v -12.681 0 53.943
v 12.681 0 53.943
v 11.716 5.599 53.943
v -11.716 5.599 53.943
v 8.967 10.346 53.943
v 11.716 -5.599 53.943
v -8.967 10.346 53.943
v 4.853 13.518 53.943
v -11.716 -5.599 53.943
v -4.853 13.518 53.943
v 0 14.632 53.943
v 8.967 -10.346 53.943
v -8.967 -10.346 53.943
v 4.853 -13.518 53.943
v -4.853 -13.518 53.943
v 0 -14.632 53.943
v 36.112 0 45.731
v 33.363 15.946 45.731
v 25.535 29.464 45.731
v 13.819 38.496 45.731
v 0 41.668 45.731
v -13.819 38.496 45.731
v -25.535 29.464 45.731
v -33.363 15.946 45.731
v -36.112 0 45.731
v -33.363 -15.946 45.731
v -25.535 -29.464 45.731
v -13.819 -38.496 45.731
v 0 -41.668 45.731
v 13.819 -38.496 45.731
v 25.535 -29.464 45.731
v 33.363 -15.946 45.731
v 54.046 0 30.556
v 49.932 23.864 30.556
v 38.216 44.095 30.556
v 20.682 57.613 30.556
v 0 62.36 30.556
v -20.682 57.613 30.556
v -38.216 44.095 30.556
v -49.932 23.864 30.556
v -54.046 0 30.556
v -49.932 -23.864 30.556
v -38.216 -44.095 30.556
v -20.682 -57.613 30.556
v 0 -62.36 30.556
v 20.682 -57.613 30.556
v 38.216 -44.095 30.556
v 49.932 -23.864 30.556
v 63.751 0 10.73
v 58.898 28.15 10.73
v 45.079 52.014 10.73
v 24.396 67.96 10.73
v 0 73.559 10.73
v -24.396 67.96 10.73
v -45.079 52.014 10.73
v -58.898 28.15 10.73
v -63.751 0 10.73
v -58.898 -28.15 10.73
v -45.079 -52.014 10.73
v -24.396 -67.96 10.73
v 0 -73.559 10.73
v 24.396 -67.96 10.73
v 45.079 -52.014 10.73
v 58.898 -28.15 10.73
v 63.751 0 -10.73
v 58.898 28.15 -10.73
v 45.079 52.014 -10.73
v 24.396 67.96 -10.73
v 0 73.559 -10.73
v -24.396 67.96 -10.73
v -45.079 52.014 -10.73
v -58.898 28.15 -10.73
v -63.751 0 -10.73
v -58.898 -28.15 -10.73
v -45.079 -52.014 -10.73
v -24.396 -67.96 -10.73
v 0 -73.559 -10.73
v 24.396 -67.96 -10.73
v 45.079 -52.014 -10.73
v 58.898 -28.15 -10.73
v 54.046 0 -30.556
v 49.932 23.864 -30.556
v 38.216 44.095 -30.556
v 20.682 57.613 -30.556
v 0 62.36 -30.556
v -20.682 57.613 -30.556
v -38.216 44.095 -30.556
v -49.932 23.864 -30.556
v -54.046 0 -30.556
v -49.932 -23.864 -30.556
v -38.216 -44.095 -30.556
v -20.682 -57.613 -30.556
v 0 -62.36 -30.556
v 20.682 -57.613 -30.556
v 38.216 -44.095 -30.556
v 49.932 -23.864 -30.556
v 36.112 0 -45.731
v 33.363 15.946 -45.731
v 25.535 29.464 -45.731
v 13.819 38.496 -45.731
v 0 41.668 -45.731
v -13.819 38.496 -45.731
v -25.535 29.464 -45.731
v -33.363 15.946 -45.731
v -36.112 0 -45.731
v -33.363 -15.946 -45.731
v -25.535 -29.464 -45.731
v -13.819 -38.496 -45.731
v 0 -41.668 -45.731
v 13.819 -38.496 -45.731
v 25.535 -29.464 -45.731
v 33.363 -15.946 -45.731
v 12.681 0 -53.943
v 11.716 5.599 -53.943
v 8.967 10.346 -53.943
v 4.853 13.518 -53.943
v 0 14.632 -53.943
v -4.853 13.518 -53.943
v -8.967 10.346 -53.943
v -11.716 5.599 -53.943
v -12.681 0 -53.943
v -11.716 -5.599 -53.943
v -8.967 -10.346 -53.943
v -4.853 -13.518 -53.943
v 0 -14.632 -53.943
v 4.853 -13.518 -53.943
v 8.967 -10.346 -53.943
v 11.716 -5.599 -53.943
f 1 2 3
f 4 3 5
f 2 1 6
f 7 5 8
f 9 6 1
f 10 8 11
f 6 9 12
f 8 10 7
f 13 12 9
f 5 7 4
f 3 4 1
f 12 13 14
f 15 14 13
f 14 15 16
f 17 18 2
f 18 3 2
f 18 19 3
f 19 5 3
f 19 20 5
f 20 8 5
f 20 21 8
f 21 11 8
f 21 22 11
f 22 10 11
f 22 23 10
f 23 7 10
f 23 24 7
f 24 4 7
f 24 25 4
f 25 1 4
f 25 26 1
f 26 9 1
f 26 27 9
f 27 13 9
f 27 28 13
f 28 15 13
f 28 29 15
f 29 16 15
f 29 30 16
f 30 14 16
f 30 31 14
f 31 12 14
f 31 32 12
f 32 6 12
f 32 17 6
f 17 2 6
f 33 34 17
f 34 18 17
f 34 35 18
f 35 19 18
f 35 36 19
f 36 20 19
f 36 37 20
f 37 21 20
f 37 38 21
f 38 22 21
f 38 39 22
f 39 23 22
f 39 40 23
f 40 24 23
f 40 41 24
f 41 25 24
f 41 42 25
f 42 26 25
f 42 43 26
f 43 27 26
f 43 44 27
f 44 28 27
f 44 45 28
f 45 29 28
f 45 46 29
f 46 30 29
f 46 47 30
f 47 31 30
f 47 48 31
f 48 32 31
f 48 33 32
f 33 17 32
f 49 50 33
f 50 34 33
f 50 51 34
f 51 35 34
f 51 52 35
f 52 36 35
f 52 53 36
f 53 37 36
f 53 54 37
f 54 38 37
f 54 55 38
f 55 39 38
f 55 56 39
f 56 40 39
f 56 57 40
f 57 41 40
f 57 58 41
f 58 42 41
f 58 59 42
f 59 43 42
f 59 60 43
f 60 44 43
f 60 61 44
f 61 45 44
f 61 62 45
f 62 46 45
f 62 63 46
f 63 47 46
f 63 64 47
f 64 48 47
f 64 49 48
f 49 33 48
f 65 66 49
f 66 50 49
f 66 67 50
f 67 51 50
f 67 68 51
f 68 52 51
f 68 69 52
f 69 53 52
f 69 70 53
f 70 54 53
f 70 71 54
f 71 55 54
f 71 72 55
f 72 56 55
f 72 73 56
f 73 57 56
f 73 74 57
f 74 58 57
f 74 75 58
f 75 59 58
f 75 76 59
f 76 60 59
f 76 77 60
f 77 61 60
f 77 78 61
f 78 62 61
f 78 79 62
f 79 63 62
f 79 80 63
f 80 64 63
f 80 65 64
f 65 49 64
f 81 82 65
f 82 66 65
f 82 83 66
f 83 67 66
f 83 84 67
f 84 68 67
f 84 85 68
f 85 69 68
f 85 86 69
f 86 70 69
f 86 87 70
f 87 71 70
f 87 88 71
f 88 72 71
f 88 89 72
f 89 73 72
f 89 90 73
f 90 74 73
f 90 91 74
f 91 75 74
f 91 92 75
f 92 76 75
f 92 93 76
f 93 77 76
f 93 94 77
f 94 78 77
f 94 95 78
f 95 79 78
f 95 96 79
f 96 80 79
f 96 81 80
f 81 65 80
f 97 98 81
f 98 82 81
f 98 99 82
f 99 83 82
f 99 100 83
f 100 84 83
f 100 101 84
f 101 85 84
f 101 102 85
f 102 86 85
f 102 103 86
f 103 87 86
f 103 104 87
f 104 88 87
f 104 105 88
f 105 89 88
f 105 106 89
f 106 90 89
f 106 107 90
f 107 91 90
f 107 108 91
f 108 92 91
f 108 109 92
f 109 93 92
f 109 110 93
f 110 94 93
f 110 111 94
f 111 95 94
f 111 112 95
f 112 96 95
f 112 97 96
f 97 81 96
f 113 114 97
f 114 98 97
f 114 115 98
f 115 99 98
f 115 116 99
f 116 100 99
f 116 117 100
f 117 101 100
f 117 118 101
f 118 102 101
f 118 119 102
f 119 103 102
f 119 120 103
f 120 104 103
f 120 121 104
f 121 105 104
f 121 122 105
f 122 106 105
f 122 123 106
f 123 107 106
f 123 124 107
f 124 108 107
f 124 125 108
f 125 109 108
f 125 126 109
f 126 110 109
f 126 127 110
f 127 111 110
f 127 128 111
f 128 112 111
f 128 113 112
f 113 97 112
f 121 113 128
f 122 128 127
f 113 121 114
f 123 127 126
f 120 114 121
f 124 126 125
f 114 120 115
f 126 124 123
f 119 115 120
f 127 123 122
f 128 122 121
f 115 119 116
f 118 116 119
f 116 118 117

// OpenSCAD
// Generated by SolidPython 1.0.1 on 2020-07-29 00:46:51


scale(v = [13, 15, 11]) {
	sphere(r = 5);
}
/***********************************************
*********      SolidPython code:      **********
************************************************
 
# import packages: SolidPython
from solid import *
from solid.utils import *
from itertools import chain, combinations, permutations


class Resize:

    def __init__(self, scad_file):
        self.scad_file = scad_file
        #self.scad_file = import_scad(scad_file)
        # cone/cylinder param:
        self.r1 = 0
        self.r2 = 0
        self.h = 0
        # rectangular prism param:
        self.w = 0
        self.l = 0
        # ellipse param:
        self.r = 0

    # import OpenScad code (file name corresponds to shape)


    # classify shape + parameters
    def assign(self, param1, param2, param3):
        if self.scad_file == 'cone.scad':
            self.r1 = param1
            self.r2 = param2
            self.h = param3
        elif self.scad_file == 'cylinder.scad':
            self.r1 = param1
            self.r2 = param2
            self.h = param3
        elif self.scad_file == 'rectangularPrism.scad':
            self.h = param1
            self.l = param2
            self.w = param3
        else:
            self.r = param1
            self.h = param2

    # resize parameters
    def iterate(self):
        x = range(3, 20, 2)
        i = 1
        if self.scad_file == 'cone.scad':
            tempList = list(permutations(x, 2))
            for temp in tempList:
                param1 = temp[0]
                param2 = temp[1]
                filepath = 'produced_scad_files/' + 'cone' + str(param1) + '_' + str(param2) + '_' + '.scad'
                scad_render_to_file(cylinder(h=param1, r1=param2, r2=0), filepath)

        elif self.scad_file == 'cylinder.scad':
            tempList = list(permutations(x, 3))
            for temp in tempList:
                param1 = temp[0]
                param2 = temp[1]
                filepath = 'produced_scad_files/' + 'cylinder' + str(param1) + '_' + str(param2) + '_' + '.scad'
                scad_render_to_file(cylinder(h=param1, r1=param2, r2=param2), filepath)

        elif self.scad_file == 'rectangularPrism.scad':
            tempList = list(permutations(x, 3))
            for temp in tempList:
                param1 = temp[0]
                param2 = temp[1]
                param3 = temp[2]
                filepath = 'produced_scad_files/' + 'rectangularPrism' + str(param1) + '_' + str(param2) + '_' + str(
                    param3) + '.scad'
                scad_render_to_file(cube(size=(param1, param2, param3)), filepath)

        elif self.scad_file == 'ellipse.scad':
            tempList = list(permutations(x, 4))
            for temp in tempList:
                param1 = temp[0]
                param2 = temp[1]
                param3 = temp[2]
                param4 = temp[3]
                filepath = 'produced_scad_files/' + 'ellipse' + str(param1) + '_' + str(param2) + '_' + str(param3) + '_' + str(param4) + '.scad'
                scad_render_to_file(scale([param1, param2, param3])(sphere(r=param4)), filepath)

    def render_to_scadfile(self):
        scad_render_to_file(scad, 'example.scad') 
 
************************************************/
